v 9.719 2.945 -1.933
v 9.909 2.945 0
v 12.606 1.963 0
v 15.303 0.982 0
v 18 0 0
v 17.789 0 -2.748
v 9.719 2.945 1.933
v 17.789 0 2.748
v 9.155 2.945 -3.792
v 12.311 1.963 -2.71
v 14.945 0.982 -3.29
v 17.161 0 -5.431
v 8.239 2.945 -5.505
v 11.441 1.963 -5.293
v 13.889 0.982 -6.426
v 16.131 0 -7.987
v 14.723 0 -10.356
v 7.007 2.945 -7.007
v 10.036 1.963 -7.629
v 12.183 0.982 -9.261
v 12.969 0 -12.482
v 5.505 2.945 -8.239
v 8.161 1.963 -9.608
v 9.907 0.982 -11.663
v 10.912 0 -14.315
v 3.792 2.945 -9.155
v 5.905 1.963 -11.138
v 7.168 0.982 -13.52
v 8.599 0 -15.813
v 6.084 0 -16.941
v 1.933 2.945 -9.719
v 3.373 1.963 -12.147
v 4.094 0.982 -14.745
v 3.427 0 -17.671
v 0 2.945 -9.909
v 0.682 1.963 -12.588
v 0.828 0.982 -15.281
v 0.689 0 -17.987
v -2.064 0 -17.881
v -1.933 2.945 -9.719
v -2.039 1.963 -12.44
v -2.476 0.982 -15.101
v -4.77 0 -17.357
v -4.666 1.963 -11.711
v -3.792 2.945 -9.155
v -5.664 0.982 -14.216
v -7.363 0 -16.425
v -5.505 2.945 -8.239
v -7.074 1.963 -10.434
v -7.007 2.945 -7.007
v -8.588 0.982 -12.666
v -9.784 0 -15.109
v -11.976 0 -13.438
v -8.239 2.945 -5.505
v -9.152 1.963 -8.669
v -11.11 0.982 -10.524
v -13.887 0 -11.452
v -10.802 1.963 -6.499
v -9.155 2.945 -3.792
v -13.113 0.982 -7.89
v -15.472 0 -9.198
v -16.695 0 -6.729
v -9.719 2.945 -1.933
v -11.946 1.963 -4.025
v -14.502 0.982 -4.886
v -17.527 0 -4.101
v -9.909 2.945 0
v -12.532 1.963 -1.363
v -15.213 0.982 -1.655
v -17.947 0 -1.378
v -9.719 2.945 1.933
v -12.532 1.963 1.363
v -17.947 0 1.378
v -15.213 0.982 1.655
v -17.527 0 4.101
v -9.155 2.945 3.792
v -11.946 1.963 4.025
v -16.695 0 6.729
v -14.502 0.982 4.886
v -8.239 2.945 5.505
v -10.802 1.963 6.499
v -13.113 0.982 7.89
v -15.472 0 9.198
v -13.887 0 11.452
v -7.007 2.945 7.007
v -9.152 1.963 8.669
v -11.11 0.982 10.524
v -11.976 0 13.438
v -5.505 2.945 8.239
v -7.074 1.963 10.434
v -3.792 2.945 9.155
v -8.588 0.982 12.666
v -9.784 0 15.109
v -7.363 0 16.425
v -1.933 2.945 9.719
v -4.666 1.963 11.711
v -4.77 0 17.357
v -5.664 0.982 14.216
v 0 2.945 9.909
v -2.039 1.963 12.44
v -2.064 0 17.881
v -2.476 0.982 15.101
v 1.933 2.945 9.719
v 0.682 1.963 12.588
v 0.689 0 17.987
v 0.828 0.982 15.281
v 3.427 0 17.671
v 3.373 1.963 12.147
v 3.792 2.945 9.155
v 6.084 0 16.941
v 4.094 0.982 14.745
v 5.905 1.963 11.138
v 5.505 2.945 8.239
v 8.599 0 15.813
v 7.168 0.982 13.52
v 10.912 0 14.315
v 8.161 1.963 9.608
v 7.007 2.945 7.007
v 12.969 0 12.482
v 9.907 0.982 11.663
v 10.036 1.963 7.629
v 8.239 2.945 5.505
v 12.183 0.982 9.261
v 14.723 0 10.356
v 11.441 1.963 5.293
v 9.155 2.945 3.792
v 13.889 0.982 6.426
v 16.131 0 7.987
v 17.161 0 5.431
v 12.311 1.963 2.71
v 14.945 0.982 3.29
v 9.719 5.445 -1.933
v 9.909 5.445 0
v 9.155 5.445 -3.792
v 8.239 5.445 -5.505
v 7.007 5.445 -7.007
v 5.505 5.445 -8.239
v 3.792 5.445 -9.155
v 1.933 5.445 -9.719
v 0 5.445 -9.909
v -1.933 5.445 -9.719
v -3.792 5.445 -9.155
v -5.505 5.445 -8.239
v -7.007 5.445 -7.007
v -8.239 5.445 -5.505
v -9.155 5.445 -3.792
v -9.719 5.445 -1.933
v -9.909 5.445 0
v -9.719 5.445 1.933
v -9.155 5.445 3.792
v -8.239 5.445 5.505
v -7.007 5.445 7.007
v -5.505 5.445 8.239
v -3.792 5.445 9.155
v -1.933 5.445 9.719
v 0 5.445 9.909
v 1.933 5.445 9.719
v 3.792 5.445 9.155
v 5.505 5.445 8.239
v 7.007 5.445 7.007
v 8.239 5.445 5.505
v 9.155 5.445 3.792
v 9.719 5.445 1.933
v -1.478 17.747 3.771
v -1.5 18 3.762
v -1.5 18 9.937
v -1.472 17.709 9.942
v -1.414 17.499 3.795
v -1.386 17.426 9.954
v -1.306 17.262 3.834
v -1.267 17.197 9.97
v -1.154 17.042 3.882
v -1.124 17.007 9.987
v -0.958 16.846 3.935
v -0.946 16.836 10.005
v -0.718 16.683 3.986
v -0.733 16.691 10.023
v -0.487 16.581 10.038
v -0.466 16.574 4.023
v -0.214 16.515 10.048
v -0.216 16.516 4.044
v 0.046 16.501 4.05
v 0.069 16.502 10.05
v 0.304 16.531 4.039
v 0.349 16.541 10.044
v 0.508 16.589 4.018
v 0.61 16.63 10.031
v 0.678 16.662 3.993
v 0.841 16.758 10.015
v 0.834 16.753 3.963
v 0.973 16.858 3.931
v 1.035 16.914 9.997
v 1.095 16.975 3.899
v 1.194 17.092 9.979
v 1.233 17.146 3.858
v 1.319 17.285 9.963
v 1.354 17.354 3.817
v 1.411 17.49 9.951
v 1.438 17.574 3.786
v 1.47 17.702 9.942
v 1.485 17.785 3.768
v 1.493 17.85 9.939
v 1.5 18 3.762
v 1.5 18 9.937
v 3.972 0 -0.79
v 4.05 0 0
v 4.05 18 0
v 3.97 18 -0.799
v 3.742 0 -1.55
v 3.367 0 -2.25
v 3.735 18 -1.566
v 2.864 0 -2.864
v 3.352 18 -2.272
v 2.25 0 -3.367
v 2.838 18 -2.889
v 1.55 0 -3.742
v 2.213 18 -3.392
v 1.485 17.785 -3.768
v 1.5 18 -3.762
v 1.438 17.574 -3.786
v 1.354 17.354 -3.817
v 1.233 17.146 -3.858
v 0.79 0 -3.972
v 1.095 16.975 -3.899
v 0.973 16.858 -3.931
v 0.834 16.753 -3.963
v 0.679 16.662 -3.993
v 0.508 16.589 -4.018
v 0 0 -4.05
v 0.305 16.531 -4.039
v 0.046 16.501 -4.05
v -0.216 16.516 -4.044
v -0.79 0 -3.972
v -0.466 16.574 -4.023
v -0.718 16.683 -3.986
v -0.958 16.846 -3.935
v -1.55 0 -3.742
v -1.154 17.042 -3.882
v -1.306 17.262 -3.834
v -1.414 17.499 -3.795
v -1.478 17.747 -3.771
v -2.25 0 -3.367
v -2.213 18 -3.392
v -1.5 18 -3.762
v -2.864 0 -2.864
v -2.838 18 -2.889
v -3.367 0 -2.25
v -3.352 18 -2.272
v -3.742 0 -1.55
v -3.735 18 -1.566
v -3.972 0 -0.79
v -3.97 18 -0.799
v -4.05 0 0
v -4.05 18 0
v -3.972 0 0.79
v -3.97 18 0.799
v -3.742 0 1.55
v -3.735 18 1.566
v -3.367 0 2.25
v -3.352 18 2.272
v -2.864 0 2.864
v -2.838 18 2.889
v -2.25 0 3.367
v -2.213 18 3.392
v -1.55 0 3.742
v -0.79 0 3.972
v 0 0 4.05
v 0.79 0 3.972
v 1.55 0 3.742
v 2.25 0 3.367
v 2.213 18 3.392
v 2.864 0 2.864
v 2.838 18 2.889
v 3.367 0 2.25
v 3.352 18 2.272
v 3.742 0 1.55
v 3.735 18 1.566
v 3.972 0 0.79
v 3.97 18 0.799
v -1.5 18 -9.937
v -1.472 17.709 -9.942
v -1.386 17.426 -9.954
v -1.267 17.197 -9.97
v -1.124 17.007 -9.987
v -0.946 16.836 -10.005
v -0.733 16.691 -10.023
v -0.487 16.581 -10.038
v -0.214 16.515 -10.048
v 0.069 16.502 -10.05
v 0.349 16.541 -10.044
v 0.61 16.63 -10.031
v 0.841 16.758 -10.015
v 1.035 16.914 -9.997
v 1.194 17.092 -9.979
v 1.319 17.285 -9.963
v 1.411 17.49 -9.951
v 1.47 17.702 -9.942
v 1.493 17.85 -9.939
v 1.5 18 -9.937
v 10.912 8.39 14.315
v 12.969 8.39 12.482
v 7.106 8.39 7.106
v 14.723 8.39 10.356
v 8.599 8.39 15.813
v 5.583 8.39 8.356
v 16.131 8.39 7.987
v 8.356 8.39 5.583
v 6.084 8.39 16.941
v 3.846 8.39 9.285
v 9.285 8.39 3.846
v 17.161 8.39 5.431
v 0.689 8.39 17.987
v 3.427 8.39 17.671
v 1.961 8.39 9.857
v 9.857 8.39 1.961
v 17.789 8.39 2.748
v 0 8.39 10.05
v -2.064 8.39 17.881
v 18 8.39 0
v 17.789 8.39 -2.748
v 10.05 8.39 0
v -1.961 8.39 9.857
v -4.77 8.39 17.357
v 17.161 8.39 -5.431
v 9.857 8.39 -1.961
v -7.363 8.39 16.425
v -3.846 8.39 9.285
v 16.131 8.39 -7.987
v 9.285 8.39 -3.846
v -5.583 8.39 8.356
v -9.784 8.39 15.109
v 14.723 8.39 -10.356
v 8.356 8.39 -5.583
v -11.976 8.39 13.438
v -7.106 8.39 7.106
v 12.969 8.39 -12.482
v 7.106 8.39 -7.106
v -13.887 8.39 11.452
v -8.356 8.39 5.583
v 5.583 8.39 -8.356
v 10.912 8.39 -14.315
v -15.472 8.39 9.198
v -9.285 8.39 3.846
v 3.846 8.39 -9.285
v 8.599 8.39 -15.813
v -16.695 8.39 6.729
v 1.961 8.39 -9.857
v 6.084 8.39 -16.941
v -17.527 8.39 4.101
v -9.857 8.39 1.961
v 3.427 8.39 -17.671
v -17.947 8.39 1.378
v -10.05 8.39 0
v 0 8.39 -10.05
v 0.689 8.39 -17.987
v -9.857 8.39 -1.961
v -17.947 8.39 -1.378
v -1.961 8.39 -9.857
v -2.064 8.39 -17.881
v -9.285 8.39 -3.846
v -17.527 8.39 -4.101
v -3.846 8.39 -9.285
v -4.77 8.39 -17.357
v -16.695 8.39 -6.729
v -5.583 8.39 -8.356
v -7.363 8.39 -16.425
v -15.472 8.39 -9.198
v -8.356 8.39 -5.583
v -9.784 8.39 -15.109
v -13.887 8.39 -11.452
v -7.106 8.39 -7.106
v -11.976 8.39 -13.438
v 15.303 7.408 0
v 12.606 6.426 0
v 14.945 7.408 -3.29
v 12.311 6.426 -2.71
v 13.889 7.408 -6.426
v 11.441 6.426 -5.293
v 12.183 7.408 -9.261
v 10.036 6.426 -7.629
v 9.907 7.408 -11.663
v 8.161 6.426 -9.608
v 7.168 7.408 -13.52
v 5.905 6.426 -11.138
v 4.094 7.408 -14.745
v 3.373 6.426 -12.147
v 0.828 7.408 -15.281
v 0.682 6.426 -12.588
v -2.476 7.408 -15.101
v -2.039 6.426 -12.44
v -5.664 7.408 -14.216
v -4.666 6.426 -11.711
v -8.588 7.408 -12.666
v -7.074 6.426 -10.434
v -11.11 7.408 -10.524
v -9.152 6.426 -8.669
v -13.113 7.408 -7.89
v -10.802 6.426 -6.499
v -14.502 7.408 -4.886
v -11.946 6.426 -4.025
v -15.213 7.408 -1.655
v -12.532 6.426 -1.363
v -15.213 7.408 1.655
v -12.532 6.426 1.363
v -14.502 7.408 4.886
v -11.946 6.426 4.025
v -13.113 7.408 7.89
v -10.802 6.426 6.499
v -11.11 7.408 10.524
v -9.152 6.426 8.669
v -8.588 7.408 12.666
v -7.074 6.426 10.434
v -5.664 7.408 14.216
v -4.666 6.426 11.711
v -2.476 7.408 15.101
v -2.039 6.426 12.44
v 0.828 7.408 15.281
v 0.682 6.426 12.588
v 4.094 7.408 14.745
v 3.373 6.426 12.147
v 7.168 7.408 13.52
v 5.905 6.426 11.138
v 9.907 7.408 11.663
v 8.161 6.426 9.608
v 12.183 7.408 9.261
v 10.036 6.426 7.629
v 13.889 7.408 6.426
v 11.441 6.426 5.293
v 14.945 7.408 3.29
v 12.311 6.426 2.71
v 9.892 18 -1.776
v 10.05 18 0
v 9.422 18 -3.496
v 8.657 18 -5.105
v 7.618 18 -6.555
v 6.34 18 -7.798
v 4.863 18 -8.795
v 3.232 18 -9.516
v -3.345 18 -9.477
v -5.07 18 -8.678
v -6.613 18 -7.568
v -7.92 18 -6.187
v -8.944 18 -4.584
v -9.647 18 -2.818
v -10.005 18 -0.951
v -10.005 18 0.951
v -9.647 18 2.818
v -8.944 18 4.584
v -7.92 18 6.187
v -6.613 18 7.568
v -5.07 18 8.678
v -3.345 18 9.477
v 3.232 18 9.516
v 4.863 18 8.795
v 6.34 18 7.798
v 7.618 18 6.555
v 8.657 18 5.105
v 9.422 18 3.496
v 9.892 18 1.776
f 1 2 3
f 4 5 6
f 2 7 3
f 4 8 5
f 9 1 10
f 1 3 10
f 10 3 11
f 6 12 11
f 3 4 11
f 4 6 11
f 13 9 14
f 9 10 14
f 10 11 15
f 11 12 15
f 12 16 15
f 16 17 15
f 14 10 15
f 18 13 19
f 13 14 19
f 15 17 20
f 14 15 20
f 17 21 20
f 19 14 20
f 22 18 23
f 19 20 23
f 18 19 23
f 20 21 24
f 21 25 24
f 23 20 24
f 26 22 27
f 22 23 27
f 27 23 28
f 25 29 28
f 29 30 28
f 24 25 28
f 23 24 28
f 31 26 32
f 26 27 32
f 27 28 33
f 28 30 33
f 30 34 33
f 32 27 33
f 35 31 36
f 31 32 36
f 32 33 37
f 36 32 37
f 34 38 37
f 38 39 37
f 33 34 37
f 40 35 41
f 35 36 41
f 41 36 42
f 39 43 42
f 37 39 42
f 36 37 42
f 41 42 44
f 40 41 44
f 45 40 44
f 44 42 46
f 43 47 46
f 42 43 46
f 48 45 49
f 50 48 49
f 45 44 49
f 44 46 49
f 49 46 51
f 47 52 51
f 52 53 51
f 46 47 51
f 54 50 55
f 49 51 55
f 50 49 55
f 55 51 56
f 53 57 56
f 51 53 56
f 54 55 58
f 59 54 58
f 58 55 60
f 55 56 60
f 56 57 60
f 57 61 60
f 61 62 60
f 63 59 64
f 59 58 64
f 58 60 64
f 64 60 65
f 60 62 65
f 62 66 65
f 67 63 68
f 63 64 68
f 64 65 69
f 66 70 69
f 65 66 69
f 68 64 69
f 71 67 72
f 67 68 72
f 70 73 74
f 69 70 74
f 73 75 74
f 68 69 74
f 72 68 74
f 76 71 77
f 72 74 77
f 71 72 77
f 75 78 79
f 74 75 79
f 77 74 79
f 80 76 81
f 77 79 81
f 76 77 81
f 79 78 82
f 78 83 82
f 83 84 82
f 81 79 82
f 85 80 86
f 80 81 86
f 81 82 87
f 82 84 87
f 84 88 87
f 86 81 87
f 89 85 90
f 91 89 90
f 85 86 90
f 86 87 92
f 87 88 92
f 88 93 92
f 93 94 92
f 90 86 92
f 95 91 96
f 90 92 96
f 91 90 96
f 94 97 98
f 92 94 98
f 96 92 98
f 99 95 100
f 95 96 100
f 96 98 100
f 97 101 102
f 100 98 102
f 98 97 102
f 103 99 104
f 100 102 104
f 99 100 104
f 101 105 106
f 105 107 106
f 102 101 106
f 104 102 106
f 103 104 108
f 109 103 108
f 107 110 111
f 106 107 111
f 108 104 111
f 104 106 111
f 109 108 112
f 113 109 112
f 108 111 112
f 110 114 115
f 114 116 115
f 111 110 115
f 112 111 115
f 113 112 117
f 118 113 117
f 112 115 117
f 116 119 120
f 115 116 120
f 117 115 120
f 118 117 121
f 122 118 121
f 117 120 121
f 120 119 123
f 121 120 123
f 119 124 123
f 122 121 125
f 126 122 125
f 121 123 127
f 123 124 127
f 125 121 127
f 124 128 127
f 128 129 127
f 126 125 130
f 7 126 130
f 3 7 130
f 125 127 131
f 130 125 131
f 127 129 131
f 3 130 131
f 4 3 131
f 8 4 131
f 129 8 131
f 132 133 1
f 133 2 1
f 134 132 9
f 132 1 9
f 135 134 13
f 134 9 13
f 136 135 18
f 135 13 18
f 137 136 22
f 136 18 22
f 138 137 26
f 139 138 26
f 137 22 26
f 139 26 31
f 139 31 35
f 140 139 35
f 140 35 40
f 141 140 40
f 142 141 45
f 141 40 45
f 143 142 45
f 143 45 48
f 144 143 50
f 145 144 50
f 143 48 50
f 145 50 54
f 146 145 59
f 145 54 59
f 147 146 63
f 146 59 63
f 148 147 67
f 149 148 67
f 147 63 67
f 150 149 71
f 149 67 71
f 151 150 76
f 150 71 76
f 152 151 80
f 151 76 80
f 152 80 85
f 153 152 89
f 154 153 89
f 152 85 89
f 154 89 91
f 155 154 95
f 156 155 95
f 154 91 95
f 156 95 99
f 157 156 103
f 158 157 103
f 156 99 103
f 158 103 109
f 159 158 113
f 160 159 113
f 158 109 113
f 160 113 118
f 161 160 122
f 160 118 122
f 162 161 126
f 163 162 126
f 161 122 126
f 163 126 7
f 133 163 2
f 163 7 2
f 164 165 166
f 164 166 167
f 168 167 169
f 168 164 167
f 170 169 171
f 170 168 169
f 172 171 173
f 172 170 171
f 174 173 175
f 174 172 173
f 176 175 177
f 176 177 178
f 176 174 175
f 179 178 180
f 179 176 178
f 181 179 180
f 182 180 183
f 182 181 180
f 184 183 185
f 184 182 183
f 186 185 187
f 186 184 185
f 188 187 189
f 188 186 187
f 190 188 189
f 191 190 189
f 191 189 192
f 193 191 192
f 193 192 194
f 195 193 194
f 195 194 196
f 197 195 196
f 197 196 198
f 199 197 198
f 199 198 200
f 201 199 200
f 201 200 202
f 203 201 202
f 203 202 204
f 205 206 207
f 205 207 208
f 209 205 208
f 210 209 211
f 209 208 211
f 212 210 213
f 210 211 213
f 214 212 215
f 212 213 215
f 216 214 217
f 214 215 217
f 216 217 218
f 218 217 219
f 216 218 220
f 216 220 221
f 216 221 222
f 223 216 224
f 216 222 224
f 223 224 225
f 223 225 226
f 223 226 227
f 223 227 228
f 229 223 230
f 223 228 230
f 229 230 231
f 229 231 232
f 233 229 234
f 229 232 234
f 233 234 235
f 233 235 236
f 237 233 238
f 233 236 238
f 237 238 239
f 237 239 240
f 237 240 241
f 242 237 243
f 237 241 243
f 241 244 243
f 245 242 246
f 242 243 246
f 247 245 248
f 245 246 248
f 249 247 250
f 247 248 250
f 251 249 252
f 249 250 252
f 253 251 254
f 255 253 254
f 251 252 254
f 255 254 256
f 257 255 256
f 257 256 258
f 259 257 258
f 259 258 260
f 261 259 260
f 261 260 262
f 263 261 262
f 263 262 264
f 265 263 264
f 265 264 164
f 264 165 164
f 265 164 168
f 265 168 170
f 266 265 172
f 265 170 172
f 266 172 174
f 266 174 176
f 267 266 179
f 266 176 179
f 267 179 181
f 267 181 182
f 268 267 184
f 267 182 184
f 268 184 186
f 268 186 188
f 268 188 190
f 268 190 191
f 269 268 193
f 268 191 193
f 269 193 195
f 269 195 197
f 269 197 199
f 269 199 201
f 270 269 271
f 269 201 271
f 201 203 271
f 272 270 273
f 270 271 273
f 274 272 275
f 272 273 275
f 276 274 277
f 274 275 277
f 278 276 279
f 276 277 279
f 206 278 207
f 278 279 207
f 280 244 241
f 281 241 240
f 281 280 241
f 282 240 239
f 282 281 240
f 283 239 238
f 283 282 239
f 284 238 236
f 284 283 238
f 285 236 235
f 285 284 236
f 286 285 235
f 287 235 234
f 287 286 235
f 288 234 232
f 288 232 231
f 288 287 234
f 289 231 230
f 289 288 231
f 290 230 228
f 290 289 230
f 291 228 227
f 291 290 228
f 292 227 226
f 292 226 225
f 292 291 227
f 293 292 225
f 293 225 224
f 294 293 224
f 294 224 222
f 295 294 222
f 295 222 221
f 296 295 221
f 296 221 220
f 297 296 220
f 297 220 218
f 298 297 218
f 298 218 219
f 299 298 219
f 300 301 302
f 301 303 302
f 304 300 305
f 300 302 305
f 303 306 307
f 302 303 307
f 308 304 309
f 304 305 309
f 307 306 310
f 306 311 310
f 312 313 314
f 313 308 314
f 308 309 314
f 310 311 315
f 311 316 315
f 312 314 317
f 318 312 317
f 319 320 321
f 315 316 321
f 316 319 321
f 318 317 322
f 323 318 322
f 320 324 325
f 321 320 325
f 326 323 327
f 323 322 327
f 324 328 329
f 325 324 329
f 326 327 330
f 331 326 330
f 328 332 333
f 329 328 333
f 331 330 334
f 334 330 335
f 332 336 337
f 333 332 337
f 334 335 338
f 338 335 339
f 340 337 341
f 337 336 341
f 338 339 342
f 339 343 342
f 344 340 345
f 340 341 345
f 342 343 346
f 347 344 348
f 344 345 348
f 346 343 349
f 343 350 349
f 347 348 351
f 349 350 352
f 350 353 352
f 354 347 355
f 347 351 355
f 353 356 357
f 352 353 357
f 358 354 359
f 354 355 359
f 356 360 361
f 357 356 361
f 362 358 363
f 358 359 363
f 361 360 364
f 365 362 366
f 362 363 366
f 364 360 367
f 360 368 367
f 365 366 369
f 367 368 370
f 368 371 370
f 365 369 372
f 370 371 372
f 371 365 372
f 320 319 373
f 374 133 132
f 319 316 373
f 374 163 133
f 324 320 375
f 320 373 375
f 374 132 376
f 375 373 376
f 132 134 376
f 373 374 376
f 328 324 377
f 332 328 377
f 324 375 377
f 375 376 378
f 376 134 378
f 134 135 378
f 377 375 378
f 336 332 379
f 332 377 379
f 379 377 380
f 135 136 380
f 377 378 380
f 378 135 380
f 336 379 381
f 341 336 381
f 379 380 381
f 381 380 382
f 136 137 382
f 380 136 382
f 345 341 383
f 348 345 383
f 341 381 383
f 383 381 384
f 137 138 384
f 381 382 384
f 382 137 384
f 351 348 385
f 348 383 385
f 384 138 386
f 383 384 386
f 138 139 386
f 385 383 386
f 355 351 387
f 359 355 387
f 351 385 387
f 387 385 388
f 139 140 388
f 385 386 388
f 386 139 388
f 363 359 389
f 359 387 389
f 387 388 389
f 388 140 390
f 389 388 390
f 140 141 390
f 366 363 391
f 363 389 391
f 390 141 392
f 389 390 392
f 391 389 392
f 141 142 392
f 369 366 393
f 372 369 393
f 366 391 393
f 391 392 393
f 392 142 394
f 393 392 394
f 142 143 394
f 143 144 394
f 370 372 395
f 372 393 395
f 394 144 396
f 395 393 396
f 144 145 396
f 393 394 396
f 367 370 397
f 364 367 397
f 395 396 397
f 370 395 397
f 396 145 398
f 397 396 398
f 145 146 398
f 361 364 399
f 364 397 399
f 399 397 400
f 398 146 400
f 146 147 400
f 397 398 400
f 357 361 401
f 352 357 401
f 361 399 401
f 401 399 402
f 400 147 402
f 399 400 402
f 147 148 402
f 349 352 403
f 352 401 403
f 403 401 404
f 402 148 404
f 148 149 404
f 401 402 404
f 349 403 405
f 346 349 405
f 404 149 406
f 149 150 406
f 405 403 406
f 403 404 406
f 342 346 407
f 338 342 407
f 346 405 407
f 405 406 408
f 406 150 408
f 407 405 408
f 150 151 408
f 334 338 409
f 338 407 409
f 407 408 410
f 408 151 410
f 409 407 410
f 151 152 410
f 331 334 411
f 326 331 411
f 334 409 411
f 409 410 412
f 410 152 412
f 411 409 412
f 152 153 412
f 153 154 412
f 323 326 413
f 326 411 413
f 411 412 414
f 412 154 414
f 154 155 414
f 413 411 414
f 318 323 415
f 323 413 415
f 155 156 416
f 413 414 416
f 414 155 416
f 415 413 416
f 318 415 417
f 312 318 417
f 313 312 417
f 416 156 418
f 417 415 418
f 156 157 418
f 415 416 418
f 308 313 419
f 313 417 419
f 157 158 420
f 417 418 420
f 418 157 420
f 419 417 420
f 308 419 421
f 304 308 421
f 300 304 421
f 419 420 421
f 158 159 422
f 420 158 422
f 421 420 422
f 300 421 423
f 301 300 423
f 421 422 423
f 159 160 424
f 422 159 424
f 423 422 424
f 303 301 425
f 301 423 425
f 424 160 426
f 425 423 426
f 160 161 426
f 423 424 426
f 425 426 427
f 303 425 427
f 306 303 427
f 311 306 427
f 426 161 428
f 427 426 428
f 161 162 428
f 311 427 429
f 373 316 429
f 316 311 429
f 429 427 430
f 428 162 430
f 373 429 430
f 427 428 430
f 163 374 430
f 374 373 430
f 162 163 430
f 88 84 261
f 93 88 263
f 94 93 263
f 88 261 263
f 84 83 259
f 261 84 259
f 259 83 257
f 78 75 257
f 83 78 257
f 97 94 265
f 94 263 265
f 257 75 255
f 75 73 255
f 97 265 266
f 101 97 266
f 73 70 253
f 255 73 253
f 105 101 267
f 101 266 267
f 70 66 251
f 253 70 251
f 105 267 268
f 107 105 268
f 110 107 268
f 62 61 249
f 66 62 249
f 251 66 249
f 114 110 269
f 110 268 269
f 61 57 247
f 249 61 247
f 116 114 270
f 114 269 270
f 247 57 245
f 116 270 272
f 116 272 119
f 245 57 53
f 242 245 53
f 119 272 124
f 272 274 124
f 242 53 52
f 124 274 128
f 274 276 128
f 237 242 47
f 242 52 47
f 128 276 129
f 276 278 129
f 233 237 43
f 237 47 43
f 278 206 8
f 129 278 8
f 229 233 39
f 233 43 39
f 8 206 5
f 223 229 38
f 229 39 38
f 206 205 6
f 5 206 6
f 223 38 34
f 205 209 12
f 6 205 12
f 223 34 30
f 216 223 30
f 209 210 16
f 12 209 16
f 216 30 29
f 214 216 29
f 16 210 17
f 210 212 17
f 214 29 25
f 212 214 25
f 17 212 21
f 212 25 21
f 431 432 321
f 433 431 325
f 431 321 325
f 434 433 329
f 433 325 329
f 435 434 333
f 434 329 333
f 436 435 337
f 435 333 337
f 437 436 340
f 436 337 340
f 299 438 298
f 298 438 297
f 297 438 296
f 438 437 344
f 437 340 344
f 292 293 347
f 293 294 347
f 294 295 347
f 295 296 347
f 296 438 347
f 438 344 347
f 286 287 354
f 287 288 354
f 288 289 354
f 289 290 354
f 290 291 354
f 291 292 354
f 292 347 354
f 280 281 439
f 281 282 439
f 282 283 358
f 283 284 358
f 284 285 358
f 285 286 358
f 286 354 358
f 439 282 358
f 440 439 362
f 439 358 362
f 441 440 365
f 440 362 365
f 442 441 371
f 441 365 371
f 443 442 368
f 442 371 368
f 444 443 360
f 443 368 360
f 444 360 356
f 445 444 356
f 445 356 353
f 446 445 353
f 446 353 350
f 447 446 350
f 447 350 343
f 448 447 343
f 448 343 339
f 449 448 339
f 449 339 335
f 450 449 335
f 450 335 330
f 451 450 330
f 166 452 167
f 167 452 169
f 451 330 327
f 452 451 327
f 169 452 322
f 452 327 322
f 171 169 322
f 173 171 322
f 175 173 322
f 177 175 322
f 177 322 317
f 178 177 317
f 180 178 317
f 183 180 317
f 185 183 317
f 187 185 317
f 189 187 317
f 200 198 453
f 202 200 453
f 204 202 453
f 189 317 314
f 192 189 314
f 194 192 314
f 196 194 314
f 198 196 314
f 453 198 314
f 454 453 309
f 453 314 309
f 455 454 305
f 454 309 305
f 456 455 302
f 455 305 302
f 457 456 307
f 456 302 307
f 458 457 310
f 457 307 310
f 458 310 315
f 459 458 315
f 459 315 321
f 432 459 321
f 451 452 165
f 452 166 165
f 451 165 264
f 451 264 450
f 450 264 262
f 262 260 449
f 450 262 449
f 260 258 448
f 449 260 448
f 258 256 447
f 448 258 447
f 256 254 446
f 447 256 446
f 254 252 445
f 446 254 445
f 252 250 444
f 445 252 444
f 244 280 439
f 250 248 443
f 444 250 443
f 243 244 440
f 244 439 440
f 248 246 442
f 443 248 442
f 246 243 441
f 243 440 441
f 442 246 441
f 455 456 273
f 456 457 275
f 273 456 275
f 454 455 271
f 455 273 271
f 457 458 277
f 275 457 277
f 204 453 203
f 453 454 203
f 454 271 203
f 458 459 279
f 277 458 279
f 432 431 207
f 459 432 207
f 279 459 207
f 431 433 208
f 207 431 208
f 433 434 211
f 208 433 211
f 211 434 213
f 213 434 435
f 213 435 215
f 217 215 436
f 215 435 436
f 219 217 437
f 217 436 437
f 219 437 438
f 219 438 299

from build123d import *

# Parameters (mm, degrees)
CYLINDER_R     = 1.5
CYLINDER_DEPTH = 22


with BuildPart() as cylinder:
    # Cylinder → Cylinder (new body)
    with BuildSketch(Plane(origin=(0, 18, -11), x_dir=(1, 0, 0), z_dir=(0, 0, 1))):
        Circle(CYLINDER_R)
    extrude(amount=CYLINDER_DEPTH)


with BuildPart() as cut:
    # Sketch → Revolve (revolve)
    with BuildSketch(Plane.XY):
        Polygon((4.05, 0), (4.05, 18), (10.05, 18), (10.05, 8.389587), (18, 8.389587), (9.909247, 5.444793), (9.909247, 2.944793), (18, 0), align=None)
    revolve(axis=Axis((0, 0, 0), (0, 1, 0)))

    # Cut: cut Cylinder
    add(cylinder.part, mode=Mode.SUBTRACT)


solid = cut.part
